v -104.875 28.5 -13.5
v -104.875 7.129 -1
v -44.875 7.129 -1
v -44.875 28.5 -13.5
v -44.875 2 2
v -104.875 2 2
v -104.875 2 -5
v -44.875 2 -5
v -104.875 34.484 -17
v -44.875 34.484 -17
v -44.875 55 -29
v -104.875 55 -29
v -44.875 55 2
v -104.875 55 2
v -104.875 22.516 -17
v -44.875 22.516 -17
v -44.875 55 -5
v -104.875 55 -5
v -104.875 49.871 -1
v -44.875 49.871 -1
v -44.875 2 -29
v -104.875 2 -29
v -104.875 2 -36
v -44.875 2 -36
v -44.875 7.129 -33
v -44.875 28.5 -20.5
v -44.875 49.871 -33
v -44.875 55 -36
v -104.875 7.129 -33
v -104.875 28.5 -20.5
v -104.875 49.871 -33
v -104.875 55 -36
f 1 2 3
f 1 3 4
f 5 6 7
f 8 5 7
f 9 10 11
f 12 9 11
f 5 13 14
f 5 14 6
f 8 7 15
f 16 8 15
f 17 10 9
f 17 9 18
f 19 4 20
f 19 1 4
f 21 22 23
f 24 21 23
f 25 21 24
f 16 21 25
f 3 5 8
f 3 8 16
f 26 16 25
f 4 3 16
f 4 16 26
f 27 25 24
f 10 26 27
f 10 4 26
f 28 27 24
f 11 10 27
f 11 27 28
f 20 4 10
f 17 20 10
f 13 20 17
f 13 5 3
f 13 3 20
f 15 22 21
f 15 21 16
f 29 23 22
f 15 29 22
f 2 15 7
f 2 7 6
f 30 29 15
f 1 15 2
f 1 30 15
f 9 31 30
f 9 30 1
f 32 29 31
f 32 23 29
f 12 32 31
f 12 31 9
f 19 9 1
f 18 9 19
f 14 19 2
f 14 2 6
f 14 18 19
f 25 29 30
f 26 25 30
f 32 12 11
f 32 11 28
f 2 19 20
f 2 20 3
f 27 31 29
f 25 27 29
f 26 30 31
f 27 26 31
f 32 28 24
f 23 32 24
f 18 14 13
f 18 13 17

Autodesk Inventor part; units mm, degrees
ref_plane "YZ Plane" through (0, 0, 0) normal (1, 0, 0) x (0, 1, 0)
ref_plane "XZ Plane" through (0, 0, 0) normal (0, 1, 0) x (-1, 0, 0)
ref_plane "XY Plane" through (0, 0, 0) normal (0, 0, 1) x (1, 0, 0)
ref_plane "Work Plane1" through (32.4858, 0, 0) normal (0, 0, 1) x (1, 0, 0)
sketch "Sketch1" plane through (32.4858, 0, 0) normal (0, 0, 1) x (1, 0, 0)
  line L0 (-82.3611, -0.4) -> (-82.3611, 2.4)
  line L1 (-32.4858, 2) -> (-181.2976, 2)
  line L2 (-32.4858, 55) -> (-181.2976, 55)
  line L3 (-82.3611, 54.6) -> (-82.3611, 57.4)
  line L4 (-157.3611, 54.6) -> (-157.3611, 57.4)
  line L5 (-157.3611, -0.4) -> (-157.3611, 2.4)
  line L6 (-107.3611, -0.4) -> (-107.3611, 2.4)
  line L7 (-132.3611, -0.4) -> (-132.3611, 2.4)
  line L8 (-107.3611, 54.6) -> (-107.3611, 57.4)
  line L9 (-132.3611, 54.6) -> (-132.3611, 57.4)
  line L10 (-32.4858, 0) -> (-181.2976, 0) projected
  line L11 (-32.4858, 57) -> (-181.2976, 57) projected
  line L12 (-82.3611, 2) -> (-82.3611, 55) construction
  line L13 (-157.3611, 2) -> (-157.3611, 55) construction
  line L14 (-77.3611, 2) -> (-77.3611, 55)
  line L15 (-162.3611, 2) -> (-162.3611, 55)
  dimension "d0" = 5
  dimension "d1" = 5
ref_plane "Work Plane3" through (-129.8754, 2, 0) normal (1, 0, 0) x (0, 1, 0)
ref_plane "Work Plane2" through (1.0604, 0, 0) normal (0, 0, 1) x (-1, 0, 0)
sketch "Sketch2" plane through (-129.8754, 2, 0) normal (1, 0, 0) x (0, 1, 0)
  line L0 (0, 8.3309) -> (0, -17.2762) projected
  line L1 (53, 8.3309) -> (53, -17.2762) projected
  line L2 (53, -34) -> (55, -34) projected
  line L3 (53, -34) -> (55, -34) projected
  line L4 (-2, -34) -> (0, -34) projected
  line L5 (-2, -34) -> (0, -34) projected
  line L6 (53, -34) -> (0, -34) construction
  line L7 (53, -36) -> (0, -36)
  line L8 (0, 0) -> (53, 0) construction
  line L9 (0, 0) -> (0, -8) construction
  line L10 (53, 0) -> (53, -8) construction
  line L11 (47.871, -33) -> (5.129, -33)
  line L12 (53, -29) -> (0, -29) construction
  line L13 (53, 2) -> (0, 2)
  line L14 (47.871, -1) -> (5.129, -1)
  line L15 (53, -5) -> (0, -5) construction
  line L16 (5.129, -33) -> (26.5, -20.5)
  line L17 (32.4839, -17) -> (53, -5)
  line L18 (5.129, -1) -> (26.5, -13.5)
  line L19 (32.4839, -17) -> (53, -29)
  line L20 (0, -29) -> (20.5161, -17)
  line L21 (26.5, -13.5) -> (47.871, -1)
  line L22 (0, -5) -> (20.5161, -17)
  line L23 (26.5, -20.5) -> (47.871, -33)
  line L24 (53, 2) -> (53, -5)
  line L25 (0, 2) -> (0, -5)
  line L26 (0, -29) -> (0, -36)
  line L27 (53, -29) -> (53, -36)
  point P0 (-2, 0)
  dimension "d20" = 2
  dimension "d37" = 1
  dimension "d38" = 4
  dimension "d39" = 2
  dimension "d40" = 1
  dimension "d41" = 4
extrude "Extrusion2" add sketch "Sketch2" along normal blind 85
sketch "Sketch3" plane through (-129.8754, 55, -29) normal (0, 1, 0) x (1, 0, 0)
  line L0 (0, -12) -> (85, -12) projected
  point P0 (129.8754, -29)
sketch "Sketch4" plane through (-129.8754, 2, 0) normal (-1, 0, 0) x (0, 0, 1)
  line L0 (-13.5, 26.5) -> (-1, 47.871) projected
  line L1 (-1, 47.871) -> (-1, 5.129) projected
  line L2 (-1, 5.129) -> (-13.5, 26.5) projected
  line L3 (-20.5, 26.5) -> (-33, 5.129) projected
  line L4 (-33, 5.129) -> (-33, 47.871) projected
  line L5 (-33, 47.871) -> (-20.5, 26.5) projected
  line L6 (-36, 53) -> (-36, 0) projected
  line L7 (-36, 0) -> (-29, 0) projected
  line L8 (-29, 0) -> (-17, 20.5161) projected
  line L9 (-17, 20.5161) -> (-5, 0) projected
  line L10 (-5, 0) -> (2, 0) projected
  line L11 (2, 0) -> (2, 53) projected
  line L12 (2, 53) -> (-5, 53) projected
  line L13 (-5, 53) -> (-17, 32.4839) projected
  line L14 (-17, 32.4839) -> (-29, 53) projected
  line L15 (-29, 53) -> (-36, 53) projected
  point P0 (0, -2)
extrude "Extrusion3" cut sketch "Sketch4" against normal blind 25
properties part number "legspacer_paula"
